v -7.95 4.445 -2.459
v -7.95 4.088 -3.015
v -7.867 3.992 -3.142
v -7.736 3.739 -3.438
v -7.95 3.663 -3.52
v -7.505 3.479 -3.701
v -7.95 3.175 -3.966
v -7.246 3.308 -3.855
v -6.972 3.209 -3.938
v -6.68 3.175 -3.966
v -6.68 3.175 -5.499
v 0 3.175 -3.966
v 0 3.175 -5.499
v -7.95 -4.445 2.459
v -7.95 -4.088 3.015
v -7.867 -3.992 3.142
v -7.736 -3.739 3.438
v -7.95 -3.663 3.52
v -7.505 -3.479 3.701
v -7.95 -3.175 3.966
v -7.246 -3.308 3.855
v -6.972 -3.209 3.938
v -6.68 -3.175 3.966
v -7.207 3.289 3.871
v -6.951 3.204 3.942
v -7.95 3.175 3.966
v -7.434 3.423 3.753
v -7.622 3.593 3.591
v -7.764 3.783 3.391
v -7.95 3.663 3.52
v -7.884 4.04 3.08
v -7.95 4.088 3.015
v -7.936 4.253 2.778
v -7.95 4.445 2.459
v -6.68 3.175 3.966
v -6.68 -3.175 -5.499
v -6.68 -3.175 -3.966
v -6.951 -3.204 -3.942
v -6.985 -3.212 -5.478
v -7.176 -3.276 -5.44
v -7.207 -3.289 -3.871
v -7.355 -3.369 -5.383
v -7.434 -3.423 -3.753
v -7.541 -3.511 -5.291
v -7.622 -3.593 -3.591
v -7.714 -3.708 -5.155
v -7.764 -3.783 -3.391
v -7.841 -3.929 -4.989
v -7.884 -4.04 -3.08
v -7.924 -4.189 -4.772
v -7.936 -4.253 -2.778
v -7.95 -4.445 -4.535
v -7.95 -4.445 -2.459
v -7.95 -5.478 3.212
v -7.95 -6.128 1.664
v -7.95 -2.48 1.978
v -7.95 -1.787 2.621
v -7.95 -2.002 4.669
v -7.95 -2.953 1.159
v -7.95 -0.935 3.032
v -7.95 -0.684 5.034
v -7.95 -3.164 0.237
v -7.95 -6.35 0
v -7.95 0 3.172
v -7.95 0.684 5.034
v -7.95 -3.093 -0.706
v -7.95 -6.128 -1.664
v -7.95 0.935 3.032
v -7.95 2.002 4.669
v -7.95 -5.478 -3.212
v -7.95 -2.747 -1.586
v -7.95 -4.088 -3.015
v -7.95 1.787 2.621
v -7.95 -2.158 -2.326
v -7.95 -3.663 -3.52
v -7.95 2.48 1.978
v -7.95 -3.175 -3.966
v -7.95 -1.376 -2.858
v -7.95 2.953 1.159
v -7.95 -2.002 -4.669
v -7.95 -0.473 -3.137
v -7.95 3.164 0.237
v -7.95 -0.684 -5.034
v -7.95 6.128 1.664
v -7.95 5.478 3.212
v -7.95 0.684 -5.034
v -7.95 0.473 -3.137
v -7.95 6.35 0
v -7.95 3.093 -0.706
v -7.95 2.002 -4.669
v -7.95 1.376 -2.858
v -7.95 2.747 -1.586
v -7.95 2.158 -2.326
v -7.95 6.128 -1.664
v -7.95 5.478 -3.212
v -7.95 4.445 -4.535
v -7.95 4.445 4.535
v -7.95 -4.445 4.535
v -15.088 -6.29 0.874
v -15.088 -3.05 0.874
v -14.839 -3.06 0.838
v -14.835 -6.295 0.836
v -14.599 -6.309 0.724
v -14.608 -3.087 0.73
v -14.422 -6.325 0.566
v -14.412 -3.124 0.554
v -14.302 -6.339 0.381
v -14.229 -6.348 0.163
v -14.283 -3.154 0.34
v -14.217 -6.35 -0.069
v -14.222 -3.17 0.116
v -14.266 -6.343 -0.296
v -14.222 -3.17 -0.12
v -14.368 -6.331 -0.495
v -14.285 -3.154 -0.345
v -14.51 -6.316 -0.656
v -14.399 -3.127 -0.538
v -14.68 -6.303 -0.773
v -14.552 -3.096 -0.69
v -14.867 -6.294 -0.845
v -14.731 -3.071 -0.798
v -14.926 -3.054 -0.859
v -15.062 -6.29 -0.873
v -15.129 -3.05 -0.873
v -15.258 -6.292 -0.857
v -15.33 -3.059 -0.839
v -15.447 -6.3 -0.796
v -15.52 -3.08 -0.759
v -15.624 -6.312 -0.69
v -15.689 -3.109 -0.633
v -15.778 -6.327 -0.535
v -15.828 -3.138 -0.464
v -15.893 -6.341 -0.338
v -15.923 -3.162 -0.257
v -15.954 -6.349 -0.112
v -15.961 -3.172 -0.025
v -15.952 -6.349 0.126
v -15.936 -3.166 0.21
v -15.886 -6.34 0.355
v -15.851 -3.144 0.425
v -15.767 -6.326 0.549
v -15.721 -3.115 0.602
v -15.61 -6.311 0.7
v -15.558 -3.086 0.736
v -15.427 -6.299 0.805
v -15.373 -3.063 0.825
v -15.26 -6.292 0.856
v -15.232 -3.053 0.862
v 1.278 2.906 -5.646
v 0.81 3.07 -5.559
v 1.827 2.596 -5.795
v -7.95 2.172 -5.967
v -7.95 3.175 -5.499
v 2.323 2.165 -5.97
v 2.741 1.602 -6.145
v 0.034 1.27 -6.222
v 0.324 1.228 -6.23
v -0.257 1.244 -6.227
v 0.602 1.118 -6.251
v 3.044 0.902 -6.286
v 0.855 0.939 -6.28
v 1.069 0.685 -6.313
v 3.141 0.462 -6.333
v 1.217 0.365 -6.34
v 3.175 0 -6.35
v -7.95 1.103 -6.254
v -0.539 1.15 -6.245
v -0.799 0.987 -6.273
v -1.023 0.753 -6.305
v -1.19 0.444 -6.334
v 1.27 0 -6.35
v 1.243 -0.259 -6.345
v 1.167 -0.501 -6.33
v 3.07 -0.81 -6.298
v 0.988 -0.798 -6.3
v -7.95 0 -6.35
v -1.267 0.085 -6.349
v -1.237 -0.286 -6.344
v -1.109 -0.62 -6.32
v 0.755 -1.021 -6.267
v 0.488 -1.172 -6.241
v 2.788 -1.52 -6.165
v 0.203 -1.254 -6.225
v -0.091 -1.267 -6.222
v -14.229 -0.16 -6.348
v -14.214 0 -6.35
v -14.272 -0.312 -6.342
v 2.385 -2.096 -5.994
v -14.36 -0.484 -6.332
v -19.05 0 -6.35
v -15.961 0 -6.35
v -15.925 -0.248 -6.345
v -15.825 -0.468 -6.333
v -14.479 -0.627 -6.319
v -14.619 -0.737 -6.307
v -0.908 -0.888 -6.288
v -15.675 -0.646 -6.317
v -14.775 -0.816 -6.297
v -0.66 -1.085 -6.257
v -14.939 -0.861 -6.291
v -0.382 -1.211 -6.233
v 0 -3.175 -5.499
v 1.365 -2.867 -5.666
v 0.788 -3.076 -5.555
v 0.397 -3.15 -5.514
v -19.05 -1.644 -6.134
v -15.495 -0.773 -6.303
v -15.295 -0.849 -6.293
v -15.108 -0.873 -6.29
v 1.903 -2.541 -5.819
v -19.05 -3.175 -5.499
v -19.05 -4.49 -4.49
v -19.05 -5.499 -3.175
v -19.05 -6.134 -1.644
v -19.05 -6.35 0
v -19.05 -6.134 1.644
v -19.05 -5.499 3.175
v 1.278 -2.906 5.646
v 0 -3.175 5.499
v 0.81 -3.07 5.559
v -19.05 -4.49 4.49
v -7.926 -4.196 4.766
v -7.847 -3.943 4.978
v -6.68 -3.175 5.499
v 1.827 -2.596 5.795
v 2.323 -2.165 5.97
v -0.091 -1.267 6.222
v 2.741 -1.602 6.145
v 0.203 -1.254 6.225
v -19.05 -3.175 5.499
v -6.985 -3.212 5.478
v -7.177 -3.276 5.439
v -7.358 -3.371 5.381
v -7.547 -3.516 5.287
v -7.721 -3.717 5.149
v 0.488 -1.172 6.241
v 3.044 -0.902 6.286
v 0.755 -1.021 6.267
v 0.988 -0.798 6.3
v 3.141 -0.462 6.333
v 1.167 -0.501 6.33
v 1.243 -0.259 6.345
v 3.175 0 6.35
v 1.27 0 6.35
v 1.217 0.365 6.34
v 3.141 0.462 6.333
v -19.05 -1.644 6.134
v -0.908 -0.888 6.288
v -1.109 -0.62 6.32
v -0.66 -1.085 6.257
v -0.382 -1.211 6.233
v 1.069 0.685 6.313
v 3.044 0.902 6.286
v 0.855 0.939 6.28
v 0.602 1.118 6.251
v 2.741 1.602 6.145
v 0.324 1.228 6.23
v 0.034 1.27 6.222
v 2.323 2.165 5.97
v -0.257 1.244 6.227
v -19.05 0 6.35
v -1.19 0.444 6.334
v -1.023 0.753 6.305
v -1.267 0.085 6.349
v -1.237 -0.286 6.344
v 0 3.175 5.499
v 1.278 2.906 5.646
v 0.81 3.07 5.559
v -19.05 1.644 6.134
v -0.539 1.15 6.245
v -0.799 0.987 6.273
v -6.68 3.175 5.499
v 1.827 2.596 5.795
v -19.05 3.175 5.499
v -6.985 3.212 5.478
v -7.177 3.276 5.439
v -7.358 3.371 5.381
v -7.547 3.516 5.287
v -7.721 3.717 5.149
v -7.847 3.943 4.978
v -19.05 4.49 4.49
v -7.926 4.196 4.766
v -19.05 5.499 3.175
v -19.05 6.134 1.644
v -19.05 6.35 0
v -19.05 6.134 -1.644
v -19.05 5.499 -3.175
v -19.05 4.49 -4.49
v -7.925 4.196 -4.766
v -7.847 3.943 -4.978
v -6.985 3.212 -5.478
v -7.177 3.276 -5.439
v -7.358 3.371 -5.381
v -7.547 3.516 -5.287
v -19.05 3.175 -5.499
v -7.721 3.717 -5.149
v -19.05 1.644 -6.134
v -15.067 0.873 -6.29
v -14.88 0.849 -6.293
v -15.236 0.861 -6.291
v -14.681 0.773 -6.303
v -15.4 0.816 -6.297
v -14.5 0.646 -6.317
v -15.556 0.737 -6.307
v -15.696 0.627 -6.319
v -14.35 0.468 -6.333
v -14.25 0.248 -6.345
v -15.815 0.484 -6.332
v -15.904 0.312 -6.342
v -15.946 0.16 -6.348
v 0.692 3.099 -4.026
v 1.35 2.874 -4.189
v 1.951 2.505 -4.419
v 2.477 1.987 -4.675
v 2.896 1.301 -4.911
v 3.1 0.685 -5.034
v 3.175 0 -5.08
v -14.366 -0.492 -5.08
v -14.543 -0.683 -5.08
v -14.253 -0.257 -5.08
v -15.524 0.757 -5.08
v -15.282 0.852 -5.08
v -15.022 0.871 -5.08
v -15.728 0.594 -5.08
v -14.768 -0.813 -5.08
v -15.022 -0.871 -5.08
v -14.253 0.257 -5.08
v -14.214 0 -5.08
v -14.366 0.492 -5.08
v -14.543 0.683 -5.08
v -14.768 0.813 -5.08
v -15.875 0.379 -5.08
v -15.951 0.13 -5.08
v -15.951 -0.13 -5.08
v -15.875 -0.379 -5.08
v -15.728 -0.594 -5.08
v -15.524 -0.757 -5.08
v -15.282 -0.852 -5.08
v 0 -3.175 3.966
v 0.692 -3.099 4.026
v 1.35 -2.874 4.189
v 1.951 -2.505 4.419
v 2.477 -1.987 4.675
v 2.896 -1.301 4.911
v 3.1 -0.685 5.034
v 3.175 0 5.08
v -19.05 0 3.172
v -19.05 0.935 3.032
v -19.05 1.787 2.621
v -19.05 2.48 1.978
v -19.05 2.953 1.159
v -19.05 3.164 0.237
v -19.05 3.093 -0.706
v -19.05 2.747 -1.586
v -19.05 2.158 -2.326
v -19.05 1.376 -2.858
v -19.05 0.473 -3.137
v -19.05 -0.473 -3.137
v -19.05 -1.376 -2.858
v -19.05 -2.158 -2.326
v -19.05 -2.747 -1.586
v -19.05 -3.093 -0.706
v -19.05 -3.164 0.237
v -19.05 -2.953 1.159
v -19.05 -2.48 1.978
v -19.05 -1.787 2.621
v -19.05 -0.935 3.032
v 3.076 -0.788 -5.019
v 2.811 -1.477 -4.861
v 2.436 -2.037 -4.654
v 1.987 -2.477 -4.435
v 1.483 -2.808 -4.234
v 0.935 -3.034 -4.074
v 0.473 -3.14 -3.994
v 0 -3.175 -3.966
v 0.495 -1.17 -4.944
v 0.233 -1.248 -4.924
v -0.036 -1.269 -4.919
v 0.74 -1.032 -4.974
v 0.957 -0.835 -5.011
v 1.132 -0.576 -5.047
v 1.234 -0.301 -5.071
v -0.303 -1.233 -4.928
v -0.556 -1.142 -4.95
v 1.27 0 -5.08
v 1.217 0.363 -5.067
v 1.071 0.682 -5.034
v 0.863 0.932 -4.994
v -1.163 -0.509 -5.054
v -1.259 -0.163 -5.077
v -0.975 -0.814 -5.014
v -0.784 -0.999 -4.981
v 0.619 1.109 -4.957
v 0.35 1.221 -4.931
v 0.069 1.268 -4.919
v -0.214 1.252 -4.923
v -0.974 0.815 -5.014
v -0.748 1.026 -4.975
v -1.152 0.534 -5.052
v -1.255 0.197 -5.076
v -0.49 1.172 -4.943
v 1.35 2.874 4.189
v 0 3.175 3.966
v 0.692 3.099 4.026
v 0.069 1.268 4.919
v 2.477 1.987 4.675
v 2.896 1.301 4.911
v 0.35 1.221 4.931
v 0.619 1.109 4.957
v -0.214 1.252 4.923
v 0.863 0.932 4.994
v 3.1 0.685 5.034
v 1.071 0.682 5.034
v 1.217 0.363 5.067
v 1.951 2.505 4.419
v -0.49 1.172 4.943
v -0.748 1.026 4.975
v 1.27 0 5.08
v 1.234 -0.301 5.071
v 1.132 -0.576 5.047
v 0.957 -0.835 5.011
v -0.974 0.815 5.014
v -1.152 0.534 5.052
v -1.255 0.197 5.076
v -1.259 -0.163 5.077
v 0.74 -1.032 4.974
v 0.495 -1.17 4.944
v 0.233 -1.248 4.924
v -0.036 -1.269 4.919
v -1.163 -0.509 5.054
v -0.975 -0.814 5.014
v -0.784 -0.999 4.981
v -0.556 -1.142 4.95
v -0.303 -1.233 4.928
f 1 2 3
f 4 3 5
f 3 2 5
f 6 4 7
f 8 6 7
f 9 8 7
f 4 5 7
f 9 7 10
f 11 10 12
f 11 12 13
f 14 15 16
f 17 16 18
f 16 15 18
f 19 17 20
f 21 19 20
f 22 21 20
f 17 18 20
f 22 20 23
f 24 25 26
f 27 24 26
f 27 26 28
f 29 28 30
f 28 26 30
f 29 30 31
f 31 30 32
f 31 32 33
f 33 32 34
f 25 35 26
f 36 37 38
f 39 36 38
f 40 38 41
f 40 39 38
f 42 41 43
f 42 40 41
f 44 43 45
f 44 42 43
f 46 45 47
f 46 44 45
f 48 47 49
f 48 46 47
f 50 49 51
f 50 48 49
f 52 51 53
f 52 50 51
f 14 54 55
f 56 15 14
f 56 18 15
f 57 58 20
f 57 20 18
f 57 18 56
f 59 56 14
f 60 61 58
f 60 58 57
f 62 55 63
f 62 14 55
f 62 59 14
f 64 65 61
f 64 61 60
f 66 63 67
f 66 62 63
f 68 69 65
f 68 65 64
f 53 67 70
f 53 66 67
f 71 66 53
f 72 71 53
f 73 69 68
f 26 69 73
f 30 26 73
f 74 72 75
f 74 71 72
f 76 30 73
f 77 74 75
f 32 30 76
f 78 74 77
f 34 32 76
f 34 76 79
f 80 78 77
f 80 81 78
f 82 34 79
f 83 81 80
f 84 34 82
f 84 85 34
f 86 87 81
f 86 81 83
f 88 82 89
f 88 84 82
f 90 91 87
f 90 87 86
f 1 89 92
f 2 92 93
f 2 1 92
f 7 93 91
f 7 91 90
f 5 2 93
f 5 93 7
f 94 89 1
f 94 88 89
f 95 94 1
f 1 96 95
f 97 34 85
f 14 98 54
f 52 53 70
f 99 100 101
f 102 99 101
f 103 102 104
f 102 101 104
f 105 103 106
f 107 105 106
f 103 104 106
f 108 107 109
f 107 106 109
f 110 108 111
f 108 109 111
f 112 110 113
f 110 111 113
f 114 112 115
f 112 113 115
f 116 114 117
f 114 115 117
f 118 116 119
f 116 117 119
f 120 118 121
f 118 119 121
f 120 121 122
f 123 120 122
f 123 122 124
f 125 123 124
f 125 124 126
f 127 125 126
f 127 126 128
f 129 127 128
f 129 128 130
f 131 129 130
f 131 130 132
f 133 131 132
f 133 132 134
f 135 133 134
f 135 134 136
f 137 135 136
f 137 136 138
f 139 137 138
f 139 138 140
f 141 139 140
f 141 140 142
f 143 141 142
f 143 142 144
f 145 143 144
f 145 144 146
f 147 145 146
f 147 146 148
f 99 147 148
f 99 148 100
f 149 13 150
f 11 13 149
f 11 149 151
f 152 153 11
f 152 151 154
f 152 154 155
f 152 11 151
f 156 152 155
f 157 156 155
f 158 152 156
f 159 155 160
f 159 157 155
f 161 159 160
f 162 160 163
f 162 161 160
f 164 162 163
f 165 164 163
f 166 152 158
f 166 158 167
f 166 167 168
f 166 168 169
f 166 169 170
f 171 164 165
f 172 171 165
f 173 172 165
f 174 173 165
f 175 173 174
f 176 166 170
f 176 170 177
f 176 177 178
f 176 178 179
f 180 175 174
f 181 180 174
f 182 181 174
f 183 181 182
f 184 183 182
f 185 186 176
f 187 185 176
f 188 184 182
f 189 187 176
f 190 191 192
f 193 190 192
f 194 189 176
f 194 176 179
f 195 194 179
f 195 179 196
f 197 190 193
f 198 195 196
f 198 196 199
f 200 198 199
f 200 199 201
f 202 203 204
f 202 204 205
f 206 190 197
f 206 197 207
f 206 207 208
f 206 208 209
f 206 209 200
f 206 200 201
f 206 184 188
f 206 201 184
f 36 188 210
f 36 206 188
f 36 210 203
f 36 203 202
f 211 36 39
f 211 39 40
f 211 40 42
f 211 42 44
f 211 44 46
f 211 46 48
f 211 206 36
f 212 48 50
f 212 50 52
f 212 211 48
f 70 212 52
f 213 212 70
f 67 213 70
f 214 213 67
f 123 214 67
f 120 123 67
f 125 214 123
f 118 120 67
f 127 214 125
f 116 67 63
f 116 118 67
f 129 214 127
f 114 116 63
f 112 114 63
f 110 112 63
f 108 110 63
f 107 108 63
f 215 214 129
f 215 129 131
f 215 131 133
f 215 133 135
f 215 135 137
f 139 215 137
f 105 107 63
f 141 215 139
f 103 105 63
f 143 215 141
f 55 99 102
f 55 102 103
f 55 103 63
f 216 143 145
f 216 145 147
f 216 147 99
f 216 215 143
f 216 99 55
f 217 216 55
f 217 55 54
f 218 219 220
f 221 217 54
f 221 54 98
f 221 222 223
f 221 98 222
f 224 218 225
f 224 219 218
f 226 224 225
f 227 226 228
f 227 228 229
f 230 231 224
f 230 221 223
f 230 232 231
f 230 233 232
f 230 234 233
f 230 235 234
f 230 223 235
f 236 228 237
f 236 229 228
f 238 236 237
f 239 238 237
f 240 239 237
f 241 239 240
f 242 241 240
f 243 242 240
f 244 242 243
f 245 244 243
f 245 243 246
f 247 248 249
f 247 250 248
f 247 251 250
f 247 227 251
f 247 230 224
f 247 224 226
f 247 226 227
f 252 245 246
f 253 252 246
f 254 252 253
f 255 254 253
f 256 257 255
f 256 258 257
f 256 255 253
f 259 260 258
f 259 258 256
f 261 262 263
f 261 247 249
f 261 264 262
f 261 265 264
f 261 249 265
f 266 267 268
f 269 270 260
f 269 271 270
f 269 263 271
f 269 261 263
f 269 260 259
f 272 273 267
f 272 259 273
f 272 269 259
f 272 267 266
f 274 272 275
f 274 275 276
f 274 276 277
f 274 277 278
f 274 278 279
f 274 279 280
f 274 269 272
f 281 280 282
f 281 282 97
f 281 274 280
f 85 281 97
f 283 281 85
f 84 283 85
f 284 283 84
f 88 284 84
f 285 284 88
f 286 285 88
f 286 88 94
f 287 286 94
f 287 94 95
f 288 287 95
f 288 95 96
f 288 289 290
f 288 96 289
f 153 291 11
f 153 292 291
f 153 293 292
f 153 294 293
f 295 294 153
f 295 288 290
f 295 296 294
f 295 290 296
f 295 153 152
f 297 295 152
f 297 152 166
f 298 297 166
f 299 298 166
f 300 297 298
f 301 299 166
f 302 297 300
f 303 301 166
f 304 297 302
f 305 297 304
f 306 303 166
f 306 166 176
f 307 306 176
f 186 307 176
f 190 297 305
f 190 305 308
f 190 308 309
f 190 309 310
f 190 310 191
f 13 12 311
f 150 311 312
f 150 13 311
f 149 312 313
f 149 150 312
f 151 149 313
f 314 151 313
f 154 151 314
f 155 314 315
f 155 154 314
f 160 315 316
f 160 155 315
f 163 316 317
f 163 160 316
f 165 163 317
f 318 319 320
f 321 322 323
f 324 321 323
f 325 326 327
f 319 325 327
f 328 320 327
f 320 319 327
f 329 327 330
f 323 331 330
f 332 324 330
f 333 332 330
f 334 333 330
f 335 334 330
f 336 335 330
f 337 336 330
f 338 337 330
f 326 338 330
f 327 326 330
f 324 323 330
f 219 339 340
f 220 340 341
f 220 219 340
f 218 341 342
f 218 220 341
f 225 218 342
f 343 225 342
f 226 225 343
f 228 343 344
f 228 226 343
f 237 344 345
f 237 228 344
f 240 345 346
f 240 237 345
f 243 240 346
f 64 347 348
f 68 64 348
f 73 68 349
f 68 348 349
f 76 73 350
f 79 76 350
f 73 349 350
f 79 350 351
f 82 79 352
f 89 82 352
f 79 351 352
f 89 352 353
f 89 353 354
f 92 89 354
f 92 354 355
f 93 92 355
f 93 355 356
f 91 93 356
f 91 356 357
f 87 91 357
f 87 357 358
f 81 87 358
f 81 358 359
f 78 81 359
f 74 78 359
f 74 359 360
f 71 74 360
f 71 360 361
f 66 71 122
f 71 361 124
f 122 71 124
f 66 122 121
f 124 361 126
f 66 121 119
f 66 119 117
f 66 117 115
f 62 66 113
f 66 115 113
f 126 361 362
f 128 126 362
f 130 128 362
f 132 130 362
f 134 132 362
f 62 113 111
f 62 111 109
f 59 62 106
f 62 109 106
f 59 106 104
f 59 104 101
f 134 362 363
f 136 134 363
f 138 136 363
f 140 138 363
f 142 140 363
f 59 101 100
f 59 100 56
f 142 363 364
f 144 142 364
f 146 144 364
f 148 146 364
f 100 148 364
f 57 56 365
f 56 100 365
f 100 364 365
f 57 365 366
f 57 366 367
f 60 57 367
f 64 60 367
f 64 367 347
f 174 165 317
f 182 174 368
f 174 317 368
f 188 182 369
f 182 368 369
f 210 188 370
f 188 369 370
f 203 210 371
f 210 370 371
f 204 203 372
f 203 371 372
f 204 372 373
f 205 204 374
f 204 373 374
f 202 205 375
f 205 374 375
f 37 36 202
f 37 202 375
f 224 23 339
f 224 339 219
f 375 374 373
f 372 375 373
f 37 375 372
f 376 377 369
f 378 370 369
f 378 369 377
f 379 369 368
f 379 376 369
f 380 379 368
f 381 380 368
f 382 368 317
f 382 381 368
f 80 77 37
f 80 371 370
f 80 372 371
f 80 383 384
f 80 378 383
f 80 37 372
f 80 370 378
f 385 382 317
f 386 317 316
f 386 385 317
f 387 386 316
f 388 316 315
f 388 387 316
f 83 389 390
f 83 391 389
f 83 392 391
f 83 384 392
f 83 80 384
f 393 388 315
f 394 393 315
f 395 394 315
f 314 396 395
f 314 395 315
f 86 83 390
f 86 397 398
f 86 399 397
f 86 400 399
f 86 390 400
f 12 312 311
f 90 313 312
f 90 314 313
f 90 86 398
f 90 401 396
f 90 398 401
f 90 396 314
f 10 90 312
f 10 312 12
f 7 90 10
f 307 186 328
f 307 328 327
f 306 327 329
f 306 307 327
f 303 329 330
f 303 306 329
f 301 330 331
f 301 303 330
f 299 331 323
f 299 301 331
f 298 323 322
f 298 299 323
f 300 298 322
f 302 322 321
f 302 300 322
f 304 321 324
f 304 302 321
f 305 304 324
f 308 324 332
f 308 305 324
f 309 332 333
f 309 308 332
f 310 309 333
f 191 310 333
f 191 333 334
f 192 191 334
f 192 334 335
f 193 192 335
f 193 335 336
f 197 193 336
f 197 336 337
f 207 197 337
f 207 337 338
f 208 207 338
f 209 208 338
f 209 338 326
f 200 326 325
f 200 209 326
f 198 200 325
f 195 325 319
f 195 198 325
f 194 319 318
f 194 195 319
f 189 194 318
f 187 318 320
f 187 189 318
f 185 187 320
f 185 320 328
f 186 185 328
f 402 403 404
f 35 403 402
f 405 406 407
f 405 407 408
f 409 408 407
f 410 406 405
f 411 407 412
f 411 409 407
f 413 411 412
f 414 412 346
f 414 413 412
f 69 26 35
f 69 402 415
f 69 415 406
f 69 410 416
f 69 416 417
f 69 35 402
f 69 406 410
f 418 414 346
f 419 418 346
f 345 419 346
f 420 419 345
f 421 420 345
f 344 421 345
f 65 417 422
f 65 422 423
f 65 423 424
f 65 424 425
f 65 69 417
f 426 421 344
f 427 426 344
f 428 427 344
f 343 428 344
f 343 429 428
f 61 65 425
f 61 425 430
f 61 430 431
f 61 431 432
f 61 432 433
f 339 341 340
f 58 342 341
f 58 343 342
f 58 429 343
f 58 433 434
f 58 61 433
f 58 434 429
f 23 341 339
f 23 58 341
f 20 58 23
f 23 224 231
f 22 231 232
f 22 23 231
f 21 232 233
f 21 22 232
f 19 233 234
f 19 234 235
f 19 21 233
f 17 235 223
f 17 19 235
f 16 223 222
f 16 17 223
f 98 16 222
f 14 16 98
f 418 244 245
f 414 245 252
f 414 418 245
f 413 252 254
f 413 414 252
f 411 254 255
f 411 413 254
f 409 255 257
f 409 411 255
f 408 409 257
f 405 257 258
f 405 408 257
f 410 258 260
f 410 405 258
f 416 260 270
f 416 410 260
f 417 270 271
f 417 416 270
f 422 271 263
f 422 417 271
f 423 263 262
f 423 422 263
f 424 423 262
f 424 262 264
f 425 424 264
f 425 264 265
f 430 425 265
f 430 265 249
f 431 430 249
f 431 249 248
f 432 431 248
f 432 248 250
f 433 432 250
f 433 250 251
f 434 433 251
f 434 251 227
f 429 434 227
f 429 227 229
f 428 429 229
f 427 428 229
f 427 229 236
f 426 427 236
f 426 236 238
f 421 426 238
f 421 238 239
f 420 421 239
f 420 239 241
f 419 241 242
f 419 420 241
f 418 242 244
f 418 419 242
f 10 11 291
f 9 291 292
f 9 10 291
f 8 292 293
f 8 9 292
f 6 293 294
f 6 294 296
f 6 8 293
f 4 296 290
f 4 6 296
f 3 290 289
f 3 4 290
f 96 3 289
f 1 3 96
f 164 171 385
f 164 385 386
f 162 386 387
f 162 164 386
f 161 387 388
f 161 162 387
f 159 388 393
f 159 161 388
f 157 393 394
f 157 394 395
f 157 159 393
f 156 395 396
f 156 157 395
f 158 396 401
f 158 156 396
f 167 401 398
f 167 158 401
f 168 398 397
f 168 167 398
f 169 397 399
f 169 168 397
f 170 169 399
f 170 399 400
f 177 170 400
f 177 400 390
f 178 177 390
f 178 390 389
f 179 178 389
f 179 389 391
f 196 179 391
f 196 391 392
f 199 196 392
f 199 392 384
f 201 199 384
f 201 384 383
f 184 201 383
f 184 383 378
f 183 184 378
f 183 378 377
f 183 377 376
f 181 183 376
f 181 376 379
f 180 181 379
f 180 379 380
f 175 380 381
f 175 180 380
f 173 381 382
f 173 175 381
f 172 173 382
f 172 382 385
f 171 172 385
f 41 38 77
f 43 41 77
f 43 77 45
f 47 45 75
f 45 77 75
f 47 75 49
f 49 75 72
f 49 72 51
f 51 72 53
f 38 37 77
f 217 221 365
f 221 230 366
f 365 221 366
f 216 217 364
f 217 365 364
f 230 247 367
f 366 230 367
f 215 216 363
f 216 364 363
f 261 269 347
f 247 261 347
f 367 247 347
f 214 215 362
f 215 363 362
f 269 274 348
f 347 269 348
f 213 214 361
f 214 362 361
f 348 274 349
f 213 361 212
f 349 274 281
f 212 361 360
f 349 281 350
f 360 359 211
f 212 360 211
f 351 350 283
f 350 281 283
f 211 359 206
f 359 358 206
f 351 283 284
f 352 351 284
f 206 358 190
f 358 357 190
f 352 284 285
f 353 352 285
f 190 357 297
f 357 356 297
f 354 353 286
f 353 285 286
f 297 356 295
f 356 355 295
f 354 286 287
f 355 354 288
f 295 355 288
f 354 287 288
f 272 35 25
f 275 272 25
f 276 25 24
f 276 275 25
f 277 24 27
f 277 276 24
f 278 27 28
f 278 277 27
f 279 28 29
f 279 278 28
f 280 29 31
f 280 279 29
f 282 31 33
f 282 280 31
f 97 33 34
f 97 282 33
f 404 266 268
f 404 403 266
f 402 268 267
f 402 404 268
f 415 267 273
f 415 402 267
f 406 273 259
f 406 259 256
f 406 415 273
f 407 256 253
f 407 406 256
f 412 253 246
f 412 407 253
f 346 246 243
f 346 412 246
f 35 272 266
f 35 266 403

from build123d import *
from build123d.topology import SkipClean

# Parameters (mm, degrees)
SKETCH1_R                   = 6.35
FLANGE_BOTTOM_DEPTH         = 7.9248
SKETCH2_R                   = 6.35
FLANGMIDBODY_DEPTH          = 3.175
FLANGELEGS_DEPTH            = 11.1252
FILLET1_R                   = 3.175
LOCKINGSHAFTHOLE_DEPTH      = 22.060567449
LOCKINGSHAFTHOLE_DEPTH_BACK = 22.060567449
SKETCH4_R                   = 1.27
FILLET3_R                   = 1.27
SKETCH5_R                   = 3.17246
CENTERSHAFTHOLE_DEPTH       = 24.97072446
SKETCH11_R                  = 0.873550069
SET_SCREW_DEPTH             = 22.060567459
SKETCH12_R                  = 0.873550069
SUB_DRILL_DEPTH             = 1.27


# Some blends are built 0.0001 mm under size
with BuildPart() as part:
    # Sketch1 → Flange Bottom (new body)
    with BuildSketch(Plane(origin=(-19.05, 0, 0), x_dir=(0, 0, -1), z_dir=(1, 0, 0))):
        Circle(SKETCH1_R)
    extrude(amount=FLANGE_BOTTOM_DEPTH)

    # Sketch2 → Flangmidbody (add)
    with BuildSketch(Plane(origin=(-11.1252, 0, 0), x_dir=(0, 0, -1), z_dir=(1, 0, 0))):
        Circle(SKETCH2_R)
    extrude(amount=FLANGMIDBODY_DEPTH)

    # Sketch3 → Flangelegs (add)
    with SkipClean():  # the faces are left unmerged after this step: merging them gives an invalid solid
        with BuildSketch(Plane(origin=(-7.9502, 0, 0), x_dir=(0, 0, -1), z_dir=(1, 0, 0))):
            with BuildLine():
                Line((-5.499261314, 3.175), (-3.965573729, 3.175))
                ThreePointArc((-3.965573729, 3.175), (-5.08, 0), (-3.965573729, -3.175))
                Line((-3.965573729, -3.175), (-5.499261314, -3.175))
                ThreePointArc((-5.499261314, -3.175), (-6.35, 0), (-5.499261314, 3.175))
            make_face()
            with BuildLine():
                Line((3.965573729, 3.175), (5.499261314, 3.175))
                ThreePointArc((5.499261314, 3.175), (6.35, 0), (5.499261314, -3.175))
                Line((5.499261314, -3.175), (3.965573729, -3.175))
                ThreePointArc((3.965573729, -3.175), (5.08, 0), (3.965573729, 3.175))
            make_face()
        extrude(amount=FLANGELEGS_DEPTH)

    # Fillet1
    fillet1_edges = [part.edges().sort_by_distance(p)[0] for p in [
        (3.175, -3.175, -4.732417522),
        (3.175, 3.175, -4.732417522),
        (3.175, -3.175, 4.732417522),
        (3.175, 3.175, 4.732417522),
    ]]
    fillet(fillet1_edges, radius=FILLET1_R - 0.0001)  # a hair under: the kernel refuses the full size

    # Sketch4 → Lockingshafthole (cut, two sides: drawn at the far end of the back side and taken through both)
    with BuildSketch(Plane.XY.offset(-LOCKINGSHAFTHOLE_DEPTH_BACK)):
        Circle(SKETCH4_R)
    extrude(amount=LOCKINGSHAFTHOLE_DEPTH + LOCKINGSHAFTHOLE_DEPTH_BACK, mode=Mode.SUBTRACT)

    # Fillet3
    # the kernel refuses this fillet: 1.27 mm, written as the material it adds along each edge
    with BuildSketch(Plane(origin=(-7.9502, 3.175, -0.790573729), x_dir=(1, 0, 0), z_dir=(0, 0, -1))) as fillet3_piece_1_section:
        with BuildLine():
            CenterArc((FILLET3_R, -FILLET3_R), FILLET3_R, 90, 90)
            Line((0, -FILLET3_R), (0, 0))
            Line((0, 0), (FILLET3_R, 0))
        make_face()
    fillet3_piece_1 = extrude(amount=7.883687585, mode=Mode.PRIVATE)
    fillet3_piece_1 = fillet3_piece_1 & Plane(origin=(-7.671308244, 0, 0), x_dir=(0, 0.4999999999999997, -0.8660254037844388), z_dir=(-1, 0, 0)) * Cylinder(6.35, 21, mode=Mode.PRIVATE)
    fillet3_piece_1 = fillet3_piece_1 - Plane(origin=(-7.671308244, 0, 0), x_dir=(0, -0.6249999999999998, -0.7806247497997999), z_dir=(-1, 0, 0)) * Cylinder(5.08, 21, mode=Mode.PRIVATE)
    add(fillet3_piece_1)
    with BuildSketch(Plane(origin=(-7.9502, -3.175, -8.674261314), x_dir=(1, 0, 0), z_dir=(0, 0, 1))) as fillet3_piece_2_section:
        with BuildLine():
            CenterArc((FILLET3_R, -FILLET3_R), FILLET3_R, 90, 90)
            Line((0, -FILLET3_R), (0, 0))
            Line((0, 0), (FILLET3_R, 0))
        make_face()
    fillet3_piece_2 = extrude(amount=7.883687585, mode=Mode.PRIVATE)
    fillet3_piece_2 = fillet3_piece_2 & Plane(origin=(-7.671308757, 0, 0), x_dir=(0, 0.4999999999999997, -0.8660254037844388), z_dir=(-1, 0, 0)) * Cylinder(6.35, 21, mode=Mode.PRIVATE)
    fillet3_piece_2 = fillet3_piece_2 - Plane(origin=(-7.671308757, 0, 0), x_dir=(0, -0.6249999999999998, -0.7806247497997999), z_dir=(-1, 0, 0)) * Cylinder(5.08, 21, mode=Mode.PRIVATE)
    add(fillet3_piece_2)
    with BuildSketch(Plane(origin=(-7.9502, -3.175, 0.790573729), x_dir=(0, -1, 0), z_dir=(0, 0, 1))) as fillet3_piece_3_section:
        with BuildLine():
            CenterArc((FILLET3_R, FILLET3_R), FILLET3_R, 180, 90)
            Line((0, FILLET3_R), (0, 0))
            Line((0, 0), (FILLET3_R, 0))
        make_face()
    fillet3_piece_3 = extrude(amount=7.883687585, mode=Mode.PRIVATE)
    fillet3_piece_3 = fillet3_piece_3 & Plane(origin=(-7.671308363, 0, 0), x_dir=(0, 0, -1), z_dir=(-1, 0, 0)) * Cylinder(6.35, 21, mode=Mode.PRIVATE)
    fillet3_piece_3 = fillet3_piece_3 - Plane(origin=(-7.671308363, 0, 0), x_dir=(0, 0.6250000000000004, 0.7806247497997995), z_dir=(-1, 0, 0)) * Cylinder(5.08, 21, mode=Mode.PRIVATE)
    add(fillet3_piece_3)
    with BuildSketch(Plane(origin=(-7.9502, 3.175, 8.674261314), x_dir=(0, 1, 0), z_dir=(0, 0, -1))) as fillet3_piece_4_section:
        with BuildLine():
            CenterArc((FILLET3_R, FILLET3_R), FILLET3_R, 180, 90)
            Line((0, FILLET3_R), (0, 0))
            Line((0, 0), (FILLET3_R, 0))
        make_face()
    fillet3_piece_4 = extrude(amount=7.883687585, mode=Mode.PRIVATE)
    fillet3_piece_4 = fillet3_piece_4 & Plane(origin=(-7.671308731, 0, 0), x_dir=(0, 0, -1), z_dir=(-1, 0, 0)) * Cylinder(6.35, 21, mode=Mode.PRIVATE)
    fillet3_piece_4 = fillet3_piece_4 - Plane(origin=(-7.671308731, 0, 0), x_dir=(0, 0.6250000000000004, 0.7806247497997995), z_dir=(-1, 0, 0)) * Cylinder(5.08, 21, mode=Mode.PRIVATE)
    add(fillet3_piece_4)

    # Sketch5 → CenterShaftHole (cut, through all)
    with BuildSketch(Plane.ZY.offset(19.05)):
        Circle(SKETCH5_R)
    extrude(amount=-CENTERSHAFTHOLE_DEPTH, mode=Mode.SUBTRACT)

    # Sketch11 → Set Screw (cut, through all)
    with BuildSketch(Plane(origin=(0, 0, 0), x_dir=(1, 0, 0), z_dir=(0, 1, 0))):
        with Locations(Location((-15.0876, 0, 0), (0, 0, 270))):
            Circle(SKETCH11_R)
    extrude(amount=-SET_SCREW_DEPTH, mode=Mode.SUBTRACT)

    # Sketch12 → Sub Drill (cut)
    with BuildSketch(Plane.XY.offset(-6.35)):
        with Locations((-15.0876, 0)):
            Circle(SKETCH12_R)
    extrude(amount=SUB_DRILL_DEPTH, mode=Mode.SUBTRACT)


solid = part.part
